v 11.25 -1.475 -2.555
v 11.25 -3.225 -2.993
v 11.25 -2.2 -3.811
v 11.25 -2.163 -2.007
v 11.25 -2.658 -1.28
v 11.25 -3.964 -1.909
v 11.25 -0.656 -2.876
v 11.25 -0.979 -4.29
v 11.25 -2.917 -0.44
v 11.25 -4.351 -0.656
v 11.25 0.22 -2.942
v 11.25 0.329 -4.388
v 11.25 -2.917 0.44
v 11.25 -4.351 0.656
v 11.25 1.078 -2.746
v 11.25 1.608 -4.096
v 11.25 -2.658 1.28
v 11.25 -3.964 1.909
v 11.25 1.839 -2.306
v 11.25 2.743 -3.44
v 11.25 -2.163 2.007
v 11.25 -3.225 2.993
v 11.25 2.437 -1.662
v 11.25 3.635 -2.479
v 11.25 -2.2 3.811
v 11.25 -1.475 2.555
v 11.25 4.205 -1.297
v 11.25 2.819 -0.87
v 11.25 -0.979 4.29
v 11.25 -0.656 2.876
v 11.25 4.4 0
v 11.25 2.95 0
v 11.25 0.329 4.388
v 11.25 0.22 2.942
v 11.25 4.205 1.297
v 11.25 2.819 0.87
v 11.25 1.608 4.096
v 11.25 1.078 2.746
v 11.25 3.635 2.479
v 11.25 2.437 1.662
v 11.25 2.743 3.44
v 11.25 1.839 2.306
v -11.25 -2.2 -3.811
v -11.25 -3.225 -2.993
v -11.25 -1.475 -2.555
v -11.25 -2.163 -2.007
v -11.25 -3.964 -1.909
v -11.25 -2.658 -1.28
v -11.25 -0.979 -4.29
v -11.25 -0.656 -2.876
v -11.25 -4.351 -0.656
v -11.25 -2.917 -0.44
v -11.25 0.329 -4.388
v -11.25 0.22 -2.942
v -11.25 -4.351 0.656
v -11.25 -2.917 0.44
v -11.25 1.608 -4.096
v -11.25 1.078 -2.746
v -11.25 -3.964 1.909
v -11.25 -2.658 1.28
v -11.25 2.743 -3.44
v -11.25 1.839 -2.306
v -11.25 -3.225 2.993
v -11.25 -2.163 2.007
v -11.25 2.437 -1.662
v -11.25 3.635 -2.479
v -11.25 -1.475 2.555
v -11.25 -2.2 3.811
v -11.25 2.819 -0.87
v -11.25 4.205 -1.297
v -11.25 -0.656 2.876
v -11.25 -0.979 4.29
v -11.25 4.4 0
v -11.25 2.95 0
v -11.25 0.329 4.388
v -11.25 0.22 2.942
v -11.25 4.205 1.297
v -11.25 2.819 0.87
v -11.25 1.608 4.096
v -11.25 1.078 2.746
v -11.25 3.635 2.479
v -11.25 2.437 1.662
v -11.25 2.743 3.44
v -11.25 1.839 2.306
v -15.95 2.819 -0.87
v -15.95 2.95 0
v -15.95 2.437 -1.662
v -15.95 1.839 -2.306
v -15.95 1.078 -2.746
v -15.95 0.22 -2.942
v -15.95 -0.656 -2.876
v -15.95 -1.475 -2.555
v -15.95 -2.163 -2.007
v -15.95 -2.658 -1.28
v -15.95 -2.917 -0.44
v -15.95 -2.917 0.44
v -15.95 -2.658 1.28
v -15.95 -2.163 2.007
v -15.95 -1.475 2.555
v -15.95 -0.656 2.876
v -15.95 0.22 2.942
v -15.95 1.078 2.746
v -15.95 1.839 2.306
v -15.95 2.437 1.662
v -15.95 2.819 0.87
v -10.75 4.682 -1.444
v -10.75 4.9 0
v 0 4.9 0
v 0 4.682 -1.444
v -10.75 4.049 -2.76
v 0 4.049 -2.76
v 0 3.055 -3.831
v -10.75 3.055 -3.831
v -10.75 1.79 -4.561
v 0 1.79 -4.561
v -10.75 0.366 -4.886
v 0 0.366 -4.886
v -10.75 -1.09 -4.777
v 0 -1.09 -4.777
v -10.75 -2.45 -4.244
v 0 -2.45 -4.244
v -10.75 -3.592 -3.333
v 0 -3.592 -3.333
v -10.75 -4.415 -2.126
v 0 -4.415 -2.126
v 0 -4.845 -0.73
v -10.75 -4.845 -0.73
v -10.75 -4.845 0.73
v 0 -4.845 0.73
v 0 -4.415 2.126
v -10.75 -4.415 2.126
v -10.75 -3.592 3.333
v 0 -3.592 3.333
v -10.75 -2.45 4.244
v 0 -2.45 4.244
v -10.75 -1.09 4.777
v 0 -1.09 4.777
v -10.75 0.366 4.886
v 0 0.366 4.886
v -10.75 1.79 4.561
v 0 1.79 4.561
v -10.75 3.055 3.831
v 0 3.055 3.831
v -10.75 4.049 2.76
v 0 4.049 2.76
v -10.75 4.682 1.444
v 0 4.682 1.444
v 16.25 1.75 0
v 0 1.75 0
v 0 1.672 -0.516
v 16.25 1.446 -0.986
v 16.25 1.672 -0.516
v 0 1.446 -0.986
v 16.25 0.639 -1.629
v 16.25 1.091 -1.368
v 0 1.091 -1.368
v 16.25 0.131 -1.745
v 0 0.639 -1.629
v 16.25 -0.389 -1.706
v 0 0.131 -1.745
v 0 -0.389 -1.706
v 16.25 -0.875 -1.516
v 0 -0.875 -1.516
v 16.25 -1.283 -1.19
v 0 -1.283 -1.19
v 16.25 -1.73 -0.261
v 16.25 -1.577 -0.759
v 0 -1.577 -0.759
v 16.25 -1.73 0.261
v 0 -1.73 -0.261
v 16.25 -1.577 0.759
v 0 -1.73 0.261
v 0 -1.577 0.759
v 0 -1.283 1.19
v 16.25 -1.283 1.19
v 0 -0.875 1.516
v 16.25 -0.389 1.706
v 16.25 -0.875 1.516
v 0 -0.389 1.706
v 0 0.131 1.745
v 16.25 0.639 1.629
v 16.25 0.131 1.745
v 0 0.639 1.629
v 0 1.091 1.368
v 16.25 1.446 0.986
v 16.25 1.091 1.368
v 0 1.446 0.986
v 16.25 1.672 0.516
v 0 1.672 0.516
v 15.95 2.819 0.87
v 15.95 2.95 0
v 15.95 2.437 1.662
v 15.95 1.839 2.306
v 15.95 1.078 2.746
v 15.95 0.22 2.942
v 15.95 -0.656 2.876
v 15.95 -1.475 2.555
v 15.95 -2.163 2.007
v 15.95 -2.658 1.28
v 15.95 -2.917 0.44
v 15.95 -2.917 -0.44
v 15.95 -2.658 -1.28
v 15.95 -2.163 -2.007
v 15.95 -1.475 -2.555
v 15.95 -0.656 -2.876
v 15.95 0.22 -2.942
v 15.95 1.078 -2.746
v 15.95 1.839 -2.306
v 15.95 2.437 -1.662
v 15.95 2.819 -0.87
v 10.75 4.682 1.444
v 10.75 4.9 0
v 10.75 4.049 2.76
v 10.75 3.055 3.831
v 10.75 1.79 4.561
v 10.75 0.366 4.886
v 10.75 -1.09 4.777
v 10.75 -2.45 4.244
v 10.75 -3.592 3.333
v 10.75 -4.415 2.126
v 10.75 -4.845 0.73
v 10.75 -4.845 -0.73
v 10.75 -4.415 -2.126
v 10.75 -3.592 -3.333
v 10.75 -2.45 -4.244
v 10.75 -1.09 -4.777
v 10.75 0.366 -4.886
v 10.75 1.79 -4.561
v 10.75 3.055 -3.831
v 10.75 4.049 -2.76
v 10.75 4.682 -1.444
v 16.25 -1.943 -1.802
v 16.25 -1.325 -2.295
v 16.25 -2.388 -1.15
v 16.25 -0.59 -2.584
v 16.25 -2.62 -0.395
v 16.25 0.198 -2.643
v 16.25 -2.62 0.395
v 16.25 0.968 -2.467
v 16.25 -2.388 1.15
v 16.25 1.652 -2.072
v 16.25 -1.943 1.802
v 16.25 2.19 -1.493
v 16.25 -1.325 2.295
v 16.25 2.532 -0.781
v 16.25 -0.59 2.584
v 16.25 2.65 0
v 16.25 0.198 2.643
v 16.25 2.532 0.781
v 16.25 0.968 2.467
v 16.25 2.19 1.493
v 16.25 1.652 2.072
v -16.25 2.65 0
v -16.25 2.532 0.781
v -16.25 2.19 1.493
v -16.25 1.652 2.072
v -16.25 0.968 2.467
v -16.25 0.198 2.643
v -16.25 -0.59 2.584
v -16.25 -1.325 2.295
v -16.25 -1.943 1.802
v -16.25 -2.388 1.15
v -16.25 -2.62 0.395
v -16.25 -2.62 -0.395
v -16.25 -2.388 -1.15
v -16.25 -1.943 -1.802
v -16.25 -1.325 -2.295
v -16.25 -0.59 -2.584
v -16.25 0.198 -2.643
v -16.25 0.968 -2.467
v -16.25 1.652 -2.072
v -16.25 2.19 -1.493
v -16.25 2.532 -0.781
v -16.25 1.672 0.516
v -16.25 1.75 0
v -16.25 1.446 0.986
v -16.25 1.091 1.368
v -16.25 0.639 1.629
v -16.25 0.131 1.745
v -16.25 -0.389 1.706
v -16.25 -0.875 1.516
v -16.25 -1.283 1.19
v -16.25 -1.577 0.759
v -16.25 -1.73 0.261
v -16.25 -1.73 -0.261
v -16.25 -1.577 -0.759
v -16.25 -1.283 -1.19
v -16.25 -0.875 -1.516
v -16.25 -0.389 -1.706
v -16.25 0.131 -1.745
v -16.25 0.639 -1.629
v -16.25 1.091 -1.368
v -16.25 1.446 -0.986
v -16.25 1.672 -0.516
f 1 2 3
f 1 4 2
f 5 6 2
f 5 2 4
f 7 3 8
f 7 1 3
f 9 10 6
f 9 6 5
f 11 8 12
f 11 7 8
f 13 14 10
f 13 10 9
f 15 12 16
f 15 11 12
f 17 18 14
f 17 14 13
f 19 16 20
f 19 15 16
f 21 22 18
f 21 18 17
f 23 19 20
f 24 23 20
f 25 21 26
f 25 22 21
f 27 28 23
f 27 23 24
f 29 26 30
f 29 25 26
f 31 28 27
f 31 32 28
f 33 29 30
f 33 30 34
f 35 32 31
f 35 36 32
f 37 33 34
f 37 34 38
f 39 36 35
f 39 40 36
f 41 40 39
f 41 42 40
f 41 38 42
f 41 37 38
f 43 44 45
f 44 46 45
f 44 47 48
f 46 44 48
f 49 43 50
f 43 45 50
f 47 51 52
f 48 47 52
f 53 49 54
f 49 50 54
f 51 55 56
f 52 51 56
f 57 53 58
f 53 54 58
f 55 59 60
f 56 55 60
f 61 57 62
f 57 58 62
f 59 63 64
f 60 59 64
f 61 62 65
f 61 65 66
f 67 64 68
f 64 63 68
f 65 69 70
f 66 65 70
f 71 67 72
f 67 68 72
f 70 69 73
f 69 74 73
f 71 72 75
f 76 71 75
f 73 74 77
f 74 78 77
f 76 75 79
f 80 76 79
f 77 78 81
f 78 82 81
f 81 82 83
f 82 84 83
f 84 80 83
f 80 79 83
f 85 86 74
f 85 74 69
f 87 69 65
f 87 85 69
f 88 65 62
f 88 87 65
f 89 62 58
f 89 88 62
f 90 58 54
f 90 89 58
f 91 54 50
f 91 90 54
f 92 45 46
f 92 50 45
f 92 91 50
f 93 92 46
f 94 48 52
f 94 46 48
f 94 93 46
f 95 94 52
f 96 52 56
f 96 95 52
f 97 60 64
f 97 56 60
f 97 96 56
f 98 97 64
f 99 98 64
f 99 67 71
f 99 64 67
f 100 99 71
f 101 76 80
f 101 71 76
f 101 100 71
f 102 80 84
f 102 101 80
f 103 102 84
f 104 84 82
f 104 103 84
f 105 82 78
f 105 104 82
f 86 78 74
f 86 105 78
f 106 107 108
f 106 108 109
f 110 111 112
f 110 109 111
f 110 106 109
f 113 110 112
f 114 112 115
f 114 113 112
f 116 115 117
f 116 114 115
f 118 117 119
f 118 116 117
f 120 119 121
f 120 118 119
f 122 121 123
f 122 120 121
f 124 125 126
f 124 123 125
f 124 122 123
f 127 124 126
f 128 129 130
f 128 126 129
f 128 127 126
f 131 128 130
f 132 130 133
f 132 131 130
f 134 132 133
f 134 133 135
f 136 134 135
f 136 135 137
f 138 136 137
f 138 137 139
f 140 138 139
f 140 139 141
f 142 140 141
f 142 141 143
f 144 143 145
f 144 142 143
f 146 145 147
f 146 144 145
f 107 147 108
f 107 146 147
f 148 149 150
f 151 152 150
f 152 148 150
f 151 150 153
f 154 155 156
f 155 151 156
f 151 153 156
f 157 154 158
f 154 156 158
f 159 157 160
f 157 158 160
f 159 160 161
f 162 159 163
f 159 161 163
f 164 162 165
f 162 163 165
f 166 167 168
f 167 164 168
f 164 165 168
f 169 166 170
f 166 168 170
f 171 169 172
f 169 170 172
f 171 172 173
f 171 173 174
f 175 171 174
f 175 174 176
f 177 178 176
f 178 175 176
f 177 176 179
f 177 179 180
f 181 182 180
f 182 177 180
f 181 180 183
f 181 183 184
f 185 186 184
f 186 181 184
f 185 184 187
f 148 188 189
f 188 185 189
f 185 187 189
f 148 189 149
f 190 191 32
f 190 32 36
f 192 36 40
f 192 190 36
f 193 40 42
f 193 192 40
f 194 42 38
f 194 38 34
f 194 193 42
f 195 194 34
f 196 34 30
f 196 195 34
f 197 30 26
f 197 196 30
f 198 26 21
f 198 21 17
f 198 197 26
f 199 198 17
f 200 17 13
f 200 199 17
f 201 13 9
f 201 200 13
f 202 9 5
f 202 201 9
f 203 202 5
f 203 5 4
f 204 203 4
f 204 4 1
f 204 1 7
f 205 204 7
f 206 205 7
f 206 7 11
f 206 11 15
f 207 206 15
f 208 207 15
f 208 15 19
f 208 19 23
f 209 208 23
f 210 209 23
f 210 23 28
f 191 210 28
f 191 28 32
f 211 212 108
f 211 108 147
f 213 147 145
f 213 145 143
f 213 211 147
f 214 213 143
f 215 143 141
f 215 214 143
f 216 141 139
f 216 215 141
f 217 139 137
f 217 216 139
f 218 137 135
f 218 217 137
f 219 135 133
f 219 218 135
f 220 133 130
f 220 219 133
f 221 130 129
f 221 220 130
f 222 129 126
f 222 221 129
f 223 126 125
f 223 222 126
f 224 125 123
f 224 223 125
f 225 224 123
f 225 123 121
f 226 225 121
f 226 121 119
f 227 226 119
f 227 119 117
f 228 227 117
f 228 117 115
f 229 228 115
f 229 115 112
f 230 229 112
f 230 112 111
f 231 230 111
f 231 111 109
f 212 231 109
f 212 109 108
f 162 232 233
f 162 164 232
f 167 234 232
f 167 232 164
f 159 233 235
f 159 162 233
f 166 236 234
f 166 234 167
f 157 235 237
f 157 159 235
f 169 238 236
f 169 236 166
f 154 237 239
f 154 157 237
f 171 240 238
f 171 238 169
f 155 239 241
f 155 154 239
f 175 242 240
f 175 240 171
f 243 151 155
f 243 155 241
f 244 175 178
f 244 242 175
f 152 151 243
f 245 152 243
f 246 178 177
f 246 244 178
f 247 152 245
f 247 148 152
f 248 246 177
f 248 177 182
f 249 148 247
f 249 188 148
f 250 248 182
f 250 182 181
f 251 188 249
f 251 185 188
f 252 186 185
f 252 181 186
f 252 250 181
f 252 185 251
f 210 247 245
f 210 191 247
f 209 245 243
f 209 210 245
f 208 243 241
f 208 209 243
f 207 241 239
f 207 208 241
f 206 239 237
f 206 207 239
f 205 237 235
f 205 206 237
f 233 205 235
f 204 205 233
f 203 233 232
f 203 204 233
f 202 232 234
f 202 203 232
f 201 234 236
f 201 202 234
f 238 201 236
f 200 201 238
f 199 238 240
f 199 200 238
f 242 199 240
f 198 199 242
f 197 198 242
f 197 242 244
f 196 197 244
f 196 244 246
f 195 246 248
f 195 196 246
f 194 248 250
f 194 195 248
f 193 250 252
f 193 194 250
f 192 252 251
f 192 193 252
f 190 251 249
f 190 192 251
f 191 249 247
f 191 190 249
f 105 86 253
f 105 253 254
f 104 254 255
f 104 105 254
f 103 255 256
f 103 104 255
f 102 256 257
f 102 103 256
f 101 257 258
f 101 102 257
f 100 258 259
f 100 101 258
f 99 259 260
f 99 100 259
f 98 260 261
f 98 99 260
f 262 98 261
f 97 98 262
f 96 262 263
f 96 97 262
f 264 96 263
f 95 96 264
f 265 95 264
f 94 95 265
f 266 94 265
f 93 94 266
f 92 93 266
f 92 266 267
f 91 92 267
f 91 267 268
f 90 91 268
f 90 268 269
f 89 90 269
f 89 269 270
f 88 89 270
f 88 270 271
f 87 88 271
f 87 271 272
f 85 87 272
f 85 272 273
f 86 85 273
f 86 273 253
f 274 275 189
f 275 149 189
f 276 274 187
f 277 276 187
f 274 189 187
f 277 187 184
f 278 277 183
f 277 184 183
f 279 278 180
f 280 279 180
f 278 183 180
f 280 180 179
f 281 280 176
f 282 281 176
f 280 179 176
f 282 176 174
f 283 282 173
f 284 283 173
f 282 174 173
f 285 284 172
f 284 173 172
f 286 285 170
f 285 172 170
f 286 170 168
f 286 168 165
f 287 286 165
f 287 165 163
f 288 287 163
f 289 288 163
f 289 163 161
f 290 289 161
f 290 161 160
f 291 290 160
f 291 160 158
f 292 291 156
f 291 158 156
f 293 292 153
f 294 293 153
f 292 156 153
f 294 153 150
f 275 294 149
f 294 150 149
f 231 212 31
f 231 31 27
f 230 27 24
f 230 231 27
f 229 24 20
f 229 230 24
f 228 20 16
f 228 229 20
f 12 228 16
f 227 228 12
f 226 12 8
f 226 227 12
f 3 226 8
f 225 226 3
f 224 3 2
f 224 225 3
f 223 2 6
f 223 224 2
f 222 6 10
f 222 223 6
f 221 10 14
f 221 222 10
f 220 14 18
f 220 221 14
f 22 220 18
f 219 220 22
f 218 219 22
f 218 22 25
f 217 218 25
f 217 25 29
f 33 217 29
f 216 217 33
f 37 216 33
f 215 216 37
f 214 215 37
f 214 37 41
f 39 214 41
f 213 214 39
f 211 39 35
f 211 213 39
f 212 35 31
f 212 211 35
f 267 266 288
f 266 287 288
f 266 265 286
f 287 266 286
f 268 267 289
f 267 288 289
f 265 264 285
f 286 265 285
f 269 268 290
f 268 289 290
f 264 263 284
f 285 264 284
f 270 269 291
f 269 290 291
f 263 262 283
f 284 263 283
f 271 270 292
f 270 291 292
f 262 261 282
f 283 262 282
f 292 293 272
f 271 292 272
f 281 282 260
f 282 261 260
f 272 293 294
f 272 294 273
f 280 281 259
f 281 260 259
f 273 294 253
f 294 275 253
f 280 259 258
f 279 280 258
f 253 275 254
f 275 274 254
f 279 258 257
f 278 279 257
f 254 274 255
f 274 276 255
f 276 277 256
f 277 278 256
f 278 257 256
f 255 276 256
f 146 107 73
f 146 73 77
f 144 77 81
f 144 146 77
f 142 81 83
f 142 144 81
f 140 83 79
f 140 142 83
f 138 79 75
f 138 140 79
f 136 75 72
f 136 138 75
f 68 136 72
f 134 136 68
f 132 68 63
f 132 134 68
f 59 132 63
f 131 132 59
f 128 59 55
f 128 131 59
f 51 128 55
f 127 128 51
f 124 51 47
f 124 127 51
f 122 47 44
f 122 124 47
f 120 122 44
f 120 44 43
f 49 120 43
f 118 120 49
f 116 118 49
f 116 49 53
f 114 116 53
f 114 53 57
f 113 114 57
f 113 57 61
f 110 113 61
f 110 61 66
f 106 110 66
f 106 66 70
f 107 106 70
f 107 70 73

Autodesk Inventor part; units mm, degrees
ref_plane "YZ Plane" through (0, 0, 0) normal (1, 0, 0) x (0, 1, 0)
ref_plane "XZ Plane" through (0, 0, 0) normal (0, 1, 0) x (-1, 0, 0)
ref_plane "XY Plane" through (0, 0, 0) normal (0, 0, 1) x (1, 0, 0)
sketch "Эскиз2" plane through (0, 0, 0) normal (0, 0, 1) x (1, 0, 0)
  line L0 (0, 4.9) -> (11.25, 4.9)
  line L1 (11.25, 4.9) -> (11.25, 2.95)
  line L2 (11.25, 2.95) -> (16.25, 2.95)
  line L3 (16.25, 2.95) -> (16.25, 1.75)
  line L4 (16.25, 1.75) -> (0, 1.75)
  line L5 (0, 0) -> (17.7021, 0) construction
  line L6 (0, 0) -> (0, 8.5432) construction
  line L7 (0, 4.9) -> (-11.25, 4.9)
  line L8 (-11.25, 4.9) -> (-11.25, 2.95)
  line L9 (-11.25, 2.95) -> (-16.25, 2.95)
  line L10 (-16.25, 2.95) -> (-16.25, 1.75)
  line L11 (-16.25, 1.75) -> (0, 1.75)
  dimension "d3" = 9.8
  dimension "d4" = 22.5
  dimension "d6" = 5.9
  dimension "d7" = 3.5
  dimension "d12" = 5
revolve "Вращение1" add sketch "Эскиз2" angle 360 about axis through (0, 0, 0) along (1, 0, 0)
chamfer "Фаска1" distance 0.5 angle 45 2 edges at (-11.25, -4.9, 0) (11.25, -4.9, 0)
chamfer "Фаска2" distance 0.3 angle 45 2 edges at (-16.25, -2.95, 0) (16.25, -2.95, 0)
properties part number "Ось двусторонняя"
